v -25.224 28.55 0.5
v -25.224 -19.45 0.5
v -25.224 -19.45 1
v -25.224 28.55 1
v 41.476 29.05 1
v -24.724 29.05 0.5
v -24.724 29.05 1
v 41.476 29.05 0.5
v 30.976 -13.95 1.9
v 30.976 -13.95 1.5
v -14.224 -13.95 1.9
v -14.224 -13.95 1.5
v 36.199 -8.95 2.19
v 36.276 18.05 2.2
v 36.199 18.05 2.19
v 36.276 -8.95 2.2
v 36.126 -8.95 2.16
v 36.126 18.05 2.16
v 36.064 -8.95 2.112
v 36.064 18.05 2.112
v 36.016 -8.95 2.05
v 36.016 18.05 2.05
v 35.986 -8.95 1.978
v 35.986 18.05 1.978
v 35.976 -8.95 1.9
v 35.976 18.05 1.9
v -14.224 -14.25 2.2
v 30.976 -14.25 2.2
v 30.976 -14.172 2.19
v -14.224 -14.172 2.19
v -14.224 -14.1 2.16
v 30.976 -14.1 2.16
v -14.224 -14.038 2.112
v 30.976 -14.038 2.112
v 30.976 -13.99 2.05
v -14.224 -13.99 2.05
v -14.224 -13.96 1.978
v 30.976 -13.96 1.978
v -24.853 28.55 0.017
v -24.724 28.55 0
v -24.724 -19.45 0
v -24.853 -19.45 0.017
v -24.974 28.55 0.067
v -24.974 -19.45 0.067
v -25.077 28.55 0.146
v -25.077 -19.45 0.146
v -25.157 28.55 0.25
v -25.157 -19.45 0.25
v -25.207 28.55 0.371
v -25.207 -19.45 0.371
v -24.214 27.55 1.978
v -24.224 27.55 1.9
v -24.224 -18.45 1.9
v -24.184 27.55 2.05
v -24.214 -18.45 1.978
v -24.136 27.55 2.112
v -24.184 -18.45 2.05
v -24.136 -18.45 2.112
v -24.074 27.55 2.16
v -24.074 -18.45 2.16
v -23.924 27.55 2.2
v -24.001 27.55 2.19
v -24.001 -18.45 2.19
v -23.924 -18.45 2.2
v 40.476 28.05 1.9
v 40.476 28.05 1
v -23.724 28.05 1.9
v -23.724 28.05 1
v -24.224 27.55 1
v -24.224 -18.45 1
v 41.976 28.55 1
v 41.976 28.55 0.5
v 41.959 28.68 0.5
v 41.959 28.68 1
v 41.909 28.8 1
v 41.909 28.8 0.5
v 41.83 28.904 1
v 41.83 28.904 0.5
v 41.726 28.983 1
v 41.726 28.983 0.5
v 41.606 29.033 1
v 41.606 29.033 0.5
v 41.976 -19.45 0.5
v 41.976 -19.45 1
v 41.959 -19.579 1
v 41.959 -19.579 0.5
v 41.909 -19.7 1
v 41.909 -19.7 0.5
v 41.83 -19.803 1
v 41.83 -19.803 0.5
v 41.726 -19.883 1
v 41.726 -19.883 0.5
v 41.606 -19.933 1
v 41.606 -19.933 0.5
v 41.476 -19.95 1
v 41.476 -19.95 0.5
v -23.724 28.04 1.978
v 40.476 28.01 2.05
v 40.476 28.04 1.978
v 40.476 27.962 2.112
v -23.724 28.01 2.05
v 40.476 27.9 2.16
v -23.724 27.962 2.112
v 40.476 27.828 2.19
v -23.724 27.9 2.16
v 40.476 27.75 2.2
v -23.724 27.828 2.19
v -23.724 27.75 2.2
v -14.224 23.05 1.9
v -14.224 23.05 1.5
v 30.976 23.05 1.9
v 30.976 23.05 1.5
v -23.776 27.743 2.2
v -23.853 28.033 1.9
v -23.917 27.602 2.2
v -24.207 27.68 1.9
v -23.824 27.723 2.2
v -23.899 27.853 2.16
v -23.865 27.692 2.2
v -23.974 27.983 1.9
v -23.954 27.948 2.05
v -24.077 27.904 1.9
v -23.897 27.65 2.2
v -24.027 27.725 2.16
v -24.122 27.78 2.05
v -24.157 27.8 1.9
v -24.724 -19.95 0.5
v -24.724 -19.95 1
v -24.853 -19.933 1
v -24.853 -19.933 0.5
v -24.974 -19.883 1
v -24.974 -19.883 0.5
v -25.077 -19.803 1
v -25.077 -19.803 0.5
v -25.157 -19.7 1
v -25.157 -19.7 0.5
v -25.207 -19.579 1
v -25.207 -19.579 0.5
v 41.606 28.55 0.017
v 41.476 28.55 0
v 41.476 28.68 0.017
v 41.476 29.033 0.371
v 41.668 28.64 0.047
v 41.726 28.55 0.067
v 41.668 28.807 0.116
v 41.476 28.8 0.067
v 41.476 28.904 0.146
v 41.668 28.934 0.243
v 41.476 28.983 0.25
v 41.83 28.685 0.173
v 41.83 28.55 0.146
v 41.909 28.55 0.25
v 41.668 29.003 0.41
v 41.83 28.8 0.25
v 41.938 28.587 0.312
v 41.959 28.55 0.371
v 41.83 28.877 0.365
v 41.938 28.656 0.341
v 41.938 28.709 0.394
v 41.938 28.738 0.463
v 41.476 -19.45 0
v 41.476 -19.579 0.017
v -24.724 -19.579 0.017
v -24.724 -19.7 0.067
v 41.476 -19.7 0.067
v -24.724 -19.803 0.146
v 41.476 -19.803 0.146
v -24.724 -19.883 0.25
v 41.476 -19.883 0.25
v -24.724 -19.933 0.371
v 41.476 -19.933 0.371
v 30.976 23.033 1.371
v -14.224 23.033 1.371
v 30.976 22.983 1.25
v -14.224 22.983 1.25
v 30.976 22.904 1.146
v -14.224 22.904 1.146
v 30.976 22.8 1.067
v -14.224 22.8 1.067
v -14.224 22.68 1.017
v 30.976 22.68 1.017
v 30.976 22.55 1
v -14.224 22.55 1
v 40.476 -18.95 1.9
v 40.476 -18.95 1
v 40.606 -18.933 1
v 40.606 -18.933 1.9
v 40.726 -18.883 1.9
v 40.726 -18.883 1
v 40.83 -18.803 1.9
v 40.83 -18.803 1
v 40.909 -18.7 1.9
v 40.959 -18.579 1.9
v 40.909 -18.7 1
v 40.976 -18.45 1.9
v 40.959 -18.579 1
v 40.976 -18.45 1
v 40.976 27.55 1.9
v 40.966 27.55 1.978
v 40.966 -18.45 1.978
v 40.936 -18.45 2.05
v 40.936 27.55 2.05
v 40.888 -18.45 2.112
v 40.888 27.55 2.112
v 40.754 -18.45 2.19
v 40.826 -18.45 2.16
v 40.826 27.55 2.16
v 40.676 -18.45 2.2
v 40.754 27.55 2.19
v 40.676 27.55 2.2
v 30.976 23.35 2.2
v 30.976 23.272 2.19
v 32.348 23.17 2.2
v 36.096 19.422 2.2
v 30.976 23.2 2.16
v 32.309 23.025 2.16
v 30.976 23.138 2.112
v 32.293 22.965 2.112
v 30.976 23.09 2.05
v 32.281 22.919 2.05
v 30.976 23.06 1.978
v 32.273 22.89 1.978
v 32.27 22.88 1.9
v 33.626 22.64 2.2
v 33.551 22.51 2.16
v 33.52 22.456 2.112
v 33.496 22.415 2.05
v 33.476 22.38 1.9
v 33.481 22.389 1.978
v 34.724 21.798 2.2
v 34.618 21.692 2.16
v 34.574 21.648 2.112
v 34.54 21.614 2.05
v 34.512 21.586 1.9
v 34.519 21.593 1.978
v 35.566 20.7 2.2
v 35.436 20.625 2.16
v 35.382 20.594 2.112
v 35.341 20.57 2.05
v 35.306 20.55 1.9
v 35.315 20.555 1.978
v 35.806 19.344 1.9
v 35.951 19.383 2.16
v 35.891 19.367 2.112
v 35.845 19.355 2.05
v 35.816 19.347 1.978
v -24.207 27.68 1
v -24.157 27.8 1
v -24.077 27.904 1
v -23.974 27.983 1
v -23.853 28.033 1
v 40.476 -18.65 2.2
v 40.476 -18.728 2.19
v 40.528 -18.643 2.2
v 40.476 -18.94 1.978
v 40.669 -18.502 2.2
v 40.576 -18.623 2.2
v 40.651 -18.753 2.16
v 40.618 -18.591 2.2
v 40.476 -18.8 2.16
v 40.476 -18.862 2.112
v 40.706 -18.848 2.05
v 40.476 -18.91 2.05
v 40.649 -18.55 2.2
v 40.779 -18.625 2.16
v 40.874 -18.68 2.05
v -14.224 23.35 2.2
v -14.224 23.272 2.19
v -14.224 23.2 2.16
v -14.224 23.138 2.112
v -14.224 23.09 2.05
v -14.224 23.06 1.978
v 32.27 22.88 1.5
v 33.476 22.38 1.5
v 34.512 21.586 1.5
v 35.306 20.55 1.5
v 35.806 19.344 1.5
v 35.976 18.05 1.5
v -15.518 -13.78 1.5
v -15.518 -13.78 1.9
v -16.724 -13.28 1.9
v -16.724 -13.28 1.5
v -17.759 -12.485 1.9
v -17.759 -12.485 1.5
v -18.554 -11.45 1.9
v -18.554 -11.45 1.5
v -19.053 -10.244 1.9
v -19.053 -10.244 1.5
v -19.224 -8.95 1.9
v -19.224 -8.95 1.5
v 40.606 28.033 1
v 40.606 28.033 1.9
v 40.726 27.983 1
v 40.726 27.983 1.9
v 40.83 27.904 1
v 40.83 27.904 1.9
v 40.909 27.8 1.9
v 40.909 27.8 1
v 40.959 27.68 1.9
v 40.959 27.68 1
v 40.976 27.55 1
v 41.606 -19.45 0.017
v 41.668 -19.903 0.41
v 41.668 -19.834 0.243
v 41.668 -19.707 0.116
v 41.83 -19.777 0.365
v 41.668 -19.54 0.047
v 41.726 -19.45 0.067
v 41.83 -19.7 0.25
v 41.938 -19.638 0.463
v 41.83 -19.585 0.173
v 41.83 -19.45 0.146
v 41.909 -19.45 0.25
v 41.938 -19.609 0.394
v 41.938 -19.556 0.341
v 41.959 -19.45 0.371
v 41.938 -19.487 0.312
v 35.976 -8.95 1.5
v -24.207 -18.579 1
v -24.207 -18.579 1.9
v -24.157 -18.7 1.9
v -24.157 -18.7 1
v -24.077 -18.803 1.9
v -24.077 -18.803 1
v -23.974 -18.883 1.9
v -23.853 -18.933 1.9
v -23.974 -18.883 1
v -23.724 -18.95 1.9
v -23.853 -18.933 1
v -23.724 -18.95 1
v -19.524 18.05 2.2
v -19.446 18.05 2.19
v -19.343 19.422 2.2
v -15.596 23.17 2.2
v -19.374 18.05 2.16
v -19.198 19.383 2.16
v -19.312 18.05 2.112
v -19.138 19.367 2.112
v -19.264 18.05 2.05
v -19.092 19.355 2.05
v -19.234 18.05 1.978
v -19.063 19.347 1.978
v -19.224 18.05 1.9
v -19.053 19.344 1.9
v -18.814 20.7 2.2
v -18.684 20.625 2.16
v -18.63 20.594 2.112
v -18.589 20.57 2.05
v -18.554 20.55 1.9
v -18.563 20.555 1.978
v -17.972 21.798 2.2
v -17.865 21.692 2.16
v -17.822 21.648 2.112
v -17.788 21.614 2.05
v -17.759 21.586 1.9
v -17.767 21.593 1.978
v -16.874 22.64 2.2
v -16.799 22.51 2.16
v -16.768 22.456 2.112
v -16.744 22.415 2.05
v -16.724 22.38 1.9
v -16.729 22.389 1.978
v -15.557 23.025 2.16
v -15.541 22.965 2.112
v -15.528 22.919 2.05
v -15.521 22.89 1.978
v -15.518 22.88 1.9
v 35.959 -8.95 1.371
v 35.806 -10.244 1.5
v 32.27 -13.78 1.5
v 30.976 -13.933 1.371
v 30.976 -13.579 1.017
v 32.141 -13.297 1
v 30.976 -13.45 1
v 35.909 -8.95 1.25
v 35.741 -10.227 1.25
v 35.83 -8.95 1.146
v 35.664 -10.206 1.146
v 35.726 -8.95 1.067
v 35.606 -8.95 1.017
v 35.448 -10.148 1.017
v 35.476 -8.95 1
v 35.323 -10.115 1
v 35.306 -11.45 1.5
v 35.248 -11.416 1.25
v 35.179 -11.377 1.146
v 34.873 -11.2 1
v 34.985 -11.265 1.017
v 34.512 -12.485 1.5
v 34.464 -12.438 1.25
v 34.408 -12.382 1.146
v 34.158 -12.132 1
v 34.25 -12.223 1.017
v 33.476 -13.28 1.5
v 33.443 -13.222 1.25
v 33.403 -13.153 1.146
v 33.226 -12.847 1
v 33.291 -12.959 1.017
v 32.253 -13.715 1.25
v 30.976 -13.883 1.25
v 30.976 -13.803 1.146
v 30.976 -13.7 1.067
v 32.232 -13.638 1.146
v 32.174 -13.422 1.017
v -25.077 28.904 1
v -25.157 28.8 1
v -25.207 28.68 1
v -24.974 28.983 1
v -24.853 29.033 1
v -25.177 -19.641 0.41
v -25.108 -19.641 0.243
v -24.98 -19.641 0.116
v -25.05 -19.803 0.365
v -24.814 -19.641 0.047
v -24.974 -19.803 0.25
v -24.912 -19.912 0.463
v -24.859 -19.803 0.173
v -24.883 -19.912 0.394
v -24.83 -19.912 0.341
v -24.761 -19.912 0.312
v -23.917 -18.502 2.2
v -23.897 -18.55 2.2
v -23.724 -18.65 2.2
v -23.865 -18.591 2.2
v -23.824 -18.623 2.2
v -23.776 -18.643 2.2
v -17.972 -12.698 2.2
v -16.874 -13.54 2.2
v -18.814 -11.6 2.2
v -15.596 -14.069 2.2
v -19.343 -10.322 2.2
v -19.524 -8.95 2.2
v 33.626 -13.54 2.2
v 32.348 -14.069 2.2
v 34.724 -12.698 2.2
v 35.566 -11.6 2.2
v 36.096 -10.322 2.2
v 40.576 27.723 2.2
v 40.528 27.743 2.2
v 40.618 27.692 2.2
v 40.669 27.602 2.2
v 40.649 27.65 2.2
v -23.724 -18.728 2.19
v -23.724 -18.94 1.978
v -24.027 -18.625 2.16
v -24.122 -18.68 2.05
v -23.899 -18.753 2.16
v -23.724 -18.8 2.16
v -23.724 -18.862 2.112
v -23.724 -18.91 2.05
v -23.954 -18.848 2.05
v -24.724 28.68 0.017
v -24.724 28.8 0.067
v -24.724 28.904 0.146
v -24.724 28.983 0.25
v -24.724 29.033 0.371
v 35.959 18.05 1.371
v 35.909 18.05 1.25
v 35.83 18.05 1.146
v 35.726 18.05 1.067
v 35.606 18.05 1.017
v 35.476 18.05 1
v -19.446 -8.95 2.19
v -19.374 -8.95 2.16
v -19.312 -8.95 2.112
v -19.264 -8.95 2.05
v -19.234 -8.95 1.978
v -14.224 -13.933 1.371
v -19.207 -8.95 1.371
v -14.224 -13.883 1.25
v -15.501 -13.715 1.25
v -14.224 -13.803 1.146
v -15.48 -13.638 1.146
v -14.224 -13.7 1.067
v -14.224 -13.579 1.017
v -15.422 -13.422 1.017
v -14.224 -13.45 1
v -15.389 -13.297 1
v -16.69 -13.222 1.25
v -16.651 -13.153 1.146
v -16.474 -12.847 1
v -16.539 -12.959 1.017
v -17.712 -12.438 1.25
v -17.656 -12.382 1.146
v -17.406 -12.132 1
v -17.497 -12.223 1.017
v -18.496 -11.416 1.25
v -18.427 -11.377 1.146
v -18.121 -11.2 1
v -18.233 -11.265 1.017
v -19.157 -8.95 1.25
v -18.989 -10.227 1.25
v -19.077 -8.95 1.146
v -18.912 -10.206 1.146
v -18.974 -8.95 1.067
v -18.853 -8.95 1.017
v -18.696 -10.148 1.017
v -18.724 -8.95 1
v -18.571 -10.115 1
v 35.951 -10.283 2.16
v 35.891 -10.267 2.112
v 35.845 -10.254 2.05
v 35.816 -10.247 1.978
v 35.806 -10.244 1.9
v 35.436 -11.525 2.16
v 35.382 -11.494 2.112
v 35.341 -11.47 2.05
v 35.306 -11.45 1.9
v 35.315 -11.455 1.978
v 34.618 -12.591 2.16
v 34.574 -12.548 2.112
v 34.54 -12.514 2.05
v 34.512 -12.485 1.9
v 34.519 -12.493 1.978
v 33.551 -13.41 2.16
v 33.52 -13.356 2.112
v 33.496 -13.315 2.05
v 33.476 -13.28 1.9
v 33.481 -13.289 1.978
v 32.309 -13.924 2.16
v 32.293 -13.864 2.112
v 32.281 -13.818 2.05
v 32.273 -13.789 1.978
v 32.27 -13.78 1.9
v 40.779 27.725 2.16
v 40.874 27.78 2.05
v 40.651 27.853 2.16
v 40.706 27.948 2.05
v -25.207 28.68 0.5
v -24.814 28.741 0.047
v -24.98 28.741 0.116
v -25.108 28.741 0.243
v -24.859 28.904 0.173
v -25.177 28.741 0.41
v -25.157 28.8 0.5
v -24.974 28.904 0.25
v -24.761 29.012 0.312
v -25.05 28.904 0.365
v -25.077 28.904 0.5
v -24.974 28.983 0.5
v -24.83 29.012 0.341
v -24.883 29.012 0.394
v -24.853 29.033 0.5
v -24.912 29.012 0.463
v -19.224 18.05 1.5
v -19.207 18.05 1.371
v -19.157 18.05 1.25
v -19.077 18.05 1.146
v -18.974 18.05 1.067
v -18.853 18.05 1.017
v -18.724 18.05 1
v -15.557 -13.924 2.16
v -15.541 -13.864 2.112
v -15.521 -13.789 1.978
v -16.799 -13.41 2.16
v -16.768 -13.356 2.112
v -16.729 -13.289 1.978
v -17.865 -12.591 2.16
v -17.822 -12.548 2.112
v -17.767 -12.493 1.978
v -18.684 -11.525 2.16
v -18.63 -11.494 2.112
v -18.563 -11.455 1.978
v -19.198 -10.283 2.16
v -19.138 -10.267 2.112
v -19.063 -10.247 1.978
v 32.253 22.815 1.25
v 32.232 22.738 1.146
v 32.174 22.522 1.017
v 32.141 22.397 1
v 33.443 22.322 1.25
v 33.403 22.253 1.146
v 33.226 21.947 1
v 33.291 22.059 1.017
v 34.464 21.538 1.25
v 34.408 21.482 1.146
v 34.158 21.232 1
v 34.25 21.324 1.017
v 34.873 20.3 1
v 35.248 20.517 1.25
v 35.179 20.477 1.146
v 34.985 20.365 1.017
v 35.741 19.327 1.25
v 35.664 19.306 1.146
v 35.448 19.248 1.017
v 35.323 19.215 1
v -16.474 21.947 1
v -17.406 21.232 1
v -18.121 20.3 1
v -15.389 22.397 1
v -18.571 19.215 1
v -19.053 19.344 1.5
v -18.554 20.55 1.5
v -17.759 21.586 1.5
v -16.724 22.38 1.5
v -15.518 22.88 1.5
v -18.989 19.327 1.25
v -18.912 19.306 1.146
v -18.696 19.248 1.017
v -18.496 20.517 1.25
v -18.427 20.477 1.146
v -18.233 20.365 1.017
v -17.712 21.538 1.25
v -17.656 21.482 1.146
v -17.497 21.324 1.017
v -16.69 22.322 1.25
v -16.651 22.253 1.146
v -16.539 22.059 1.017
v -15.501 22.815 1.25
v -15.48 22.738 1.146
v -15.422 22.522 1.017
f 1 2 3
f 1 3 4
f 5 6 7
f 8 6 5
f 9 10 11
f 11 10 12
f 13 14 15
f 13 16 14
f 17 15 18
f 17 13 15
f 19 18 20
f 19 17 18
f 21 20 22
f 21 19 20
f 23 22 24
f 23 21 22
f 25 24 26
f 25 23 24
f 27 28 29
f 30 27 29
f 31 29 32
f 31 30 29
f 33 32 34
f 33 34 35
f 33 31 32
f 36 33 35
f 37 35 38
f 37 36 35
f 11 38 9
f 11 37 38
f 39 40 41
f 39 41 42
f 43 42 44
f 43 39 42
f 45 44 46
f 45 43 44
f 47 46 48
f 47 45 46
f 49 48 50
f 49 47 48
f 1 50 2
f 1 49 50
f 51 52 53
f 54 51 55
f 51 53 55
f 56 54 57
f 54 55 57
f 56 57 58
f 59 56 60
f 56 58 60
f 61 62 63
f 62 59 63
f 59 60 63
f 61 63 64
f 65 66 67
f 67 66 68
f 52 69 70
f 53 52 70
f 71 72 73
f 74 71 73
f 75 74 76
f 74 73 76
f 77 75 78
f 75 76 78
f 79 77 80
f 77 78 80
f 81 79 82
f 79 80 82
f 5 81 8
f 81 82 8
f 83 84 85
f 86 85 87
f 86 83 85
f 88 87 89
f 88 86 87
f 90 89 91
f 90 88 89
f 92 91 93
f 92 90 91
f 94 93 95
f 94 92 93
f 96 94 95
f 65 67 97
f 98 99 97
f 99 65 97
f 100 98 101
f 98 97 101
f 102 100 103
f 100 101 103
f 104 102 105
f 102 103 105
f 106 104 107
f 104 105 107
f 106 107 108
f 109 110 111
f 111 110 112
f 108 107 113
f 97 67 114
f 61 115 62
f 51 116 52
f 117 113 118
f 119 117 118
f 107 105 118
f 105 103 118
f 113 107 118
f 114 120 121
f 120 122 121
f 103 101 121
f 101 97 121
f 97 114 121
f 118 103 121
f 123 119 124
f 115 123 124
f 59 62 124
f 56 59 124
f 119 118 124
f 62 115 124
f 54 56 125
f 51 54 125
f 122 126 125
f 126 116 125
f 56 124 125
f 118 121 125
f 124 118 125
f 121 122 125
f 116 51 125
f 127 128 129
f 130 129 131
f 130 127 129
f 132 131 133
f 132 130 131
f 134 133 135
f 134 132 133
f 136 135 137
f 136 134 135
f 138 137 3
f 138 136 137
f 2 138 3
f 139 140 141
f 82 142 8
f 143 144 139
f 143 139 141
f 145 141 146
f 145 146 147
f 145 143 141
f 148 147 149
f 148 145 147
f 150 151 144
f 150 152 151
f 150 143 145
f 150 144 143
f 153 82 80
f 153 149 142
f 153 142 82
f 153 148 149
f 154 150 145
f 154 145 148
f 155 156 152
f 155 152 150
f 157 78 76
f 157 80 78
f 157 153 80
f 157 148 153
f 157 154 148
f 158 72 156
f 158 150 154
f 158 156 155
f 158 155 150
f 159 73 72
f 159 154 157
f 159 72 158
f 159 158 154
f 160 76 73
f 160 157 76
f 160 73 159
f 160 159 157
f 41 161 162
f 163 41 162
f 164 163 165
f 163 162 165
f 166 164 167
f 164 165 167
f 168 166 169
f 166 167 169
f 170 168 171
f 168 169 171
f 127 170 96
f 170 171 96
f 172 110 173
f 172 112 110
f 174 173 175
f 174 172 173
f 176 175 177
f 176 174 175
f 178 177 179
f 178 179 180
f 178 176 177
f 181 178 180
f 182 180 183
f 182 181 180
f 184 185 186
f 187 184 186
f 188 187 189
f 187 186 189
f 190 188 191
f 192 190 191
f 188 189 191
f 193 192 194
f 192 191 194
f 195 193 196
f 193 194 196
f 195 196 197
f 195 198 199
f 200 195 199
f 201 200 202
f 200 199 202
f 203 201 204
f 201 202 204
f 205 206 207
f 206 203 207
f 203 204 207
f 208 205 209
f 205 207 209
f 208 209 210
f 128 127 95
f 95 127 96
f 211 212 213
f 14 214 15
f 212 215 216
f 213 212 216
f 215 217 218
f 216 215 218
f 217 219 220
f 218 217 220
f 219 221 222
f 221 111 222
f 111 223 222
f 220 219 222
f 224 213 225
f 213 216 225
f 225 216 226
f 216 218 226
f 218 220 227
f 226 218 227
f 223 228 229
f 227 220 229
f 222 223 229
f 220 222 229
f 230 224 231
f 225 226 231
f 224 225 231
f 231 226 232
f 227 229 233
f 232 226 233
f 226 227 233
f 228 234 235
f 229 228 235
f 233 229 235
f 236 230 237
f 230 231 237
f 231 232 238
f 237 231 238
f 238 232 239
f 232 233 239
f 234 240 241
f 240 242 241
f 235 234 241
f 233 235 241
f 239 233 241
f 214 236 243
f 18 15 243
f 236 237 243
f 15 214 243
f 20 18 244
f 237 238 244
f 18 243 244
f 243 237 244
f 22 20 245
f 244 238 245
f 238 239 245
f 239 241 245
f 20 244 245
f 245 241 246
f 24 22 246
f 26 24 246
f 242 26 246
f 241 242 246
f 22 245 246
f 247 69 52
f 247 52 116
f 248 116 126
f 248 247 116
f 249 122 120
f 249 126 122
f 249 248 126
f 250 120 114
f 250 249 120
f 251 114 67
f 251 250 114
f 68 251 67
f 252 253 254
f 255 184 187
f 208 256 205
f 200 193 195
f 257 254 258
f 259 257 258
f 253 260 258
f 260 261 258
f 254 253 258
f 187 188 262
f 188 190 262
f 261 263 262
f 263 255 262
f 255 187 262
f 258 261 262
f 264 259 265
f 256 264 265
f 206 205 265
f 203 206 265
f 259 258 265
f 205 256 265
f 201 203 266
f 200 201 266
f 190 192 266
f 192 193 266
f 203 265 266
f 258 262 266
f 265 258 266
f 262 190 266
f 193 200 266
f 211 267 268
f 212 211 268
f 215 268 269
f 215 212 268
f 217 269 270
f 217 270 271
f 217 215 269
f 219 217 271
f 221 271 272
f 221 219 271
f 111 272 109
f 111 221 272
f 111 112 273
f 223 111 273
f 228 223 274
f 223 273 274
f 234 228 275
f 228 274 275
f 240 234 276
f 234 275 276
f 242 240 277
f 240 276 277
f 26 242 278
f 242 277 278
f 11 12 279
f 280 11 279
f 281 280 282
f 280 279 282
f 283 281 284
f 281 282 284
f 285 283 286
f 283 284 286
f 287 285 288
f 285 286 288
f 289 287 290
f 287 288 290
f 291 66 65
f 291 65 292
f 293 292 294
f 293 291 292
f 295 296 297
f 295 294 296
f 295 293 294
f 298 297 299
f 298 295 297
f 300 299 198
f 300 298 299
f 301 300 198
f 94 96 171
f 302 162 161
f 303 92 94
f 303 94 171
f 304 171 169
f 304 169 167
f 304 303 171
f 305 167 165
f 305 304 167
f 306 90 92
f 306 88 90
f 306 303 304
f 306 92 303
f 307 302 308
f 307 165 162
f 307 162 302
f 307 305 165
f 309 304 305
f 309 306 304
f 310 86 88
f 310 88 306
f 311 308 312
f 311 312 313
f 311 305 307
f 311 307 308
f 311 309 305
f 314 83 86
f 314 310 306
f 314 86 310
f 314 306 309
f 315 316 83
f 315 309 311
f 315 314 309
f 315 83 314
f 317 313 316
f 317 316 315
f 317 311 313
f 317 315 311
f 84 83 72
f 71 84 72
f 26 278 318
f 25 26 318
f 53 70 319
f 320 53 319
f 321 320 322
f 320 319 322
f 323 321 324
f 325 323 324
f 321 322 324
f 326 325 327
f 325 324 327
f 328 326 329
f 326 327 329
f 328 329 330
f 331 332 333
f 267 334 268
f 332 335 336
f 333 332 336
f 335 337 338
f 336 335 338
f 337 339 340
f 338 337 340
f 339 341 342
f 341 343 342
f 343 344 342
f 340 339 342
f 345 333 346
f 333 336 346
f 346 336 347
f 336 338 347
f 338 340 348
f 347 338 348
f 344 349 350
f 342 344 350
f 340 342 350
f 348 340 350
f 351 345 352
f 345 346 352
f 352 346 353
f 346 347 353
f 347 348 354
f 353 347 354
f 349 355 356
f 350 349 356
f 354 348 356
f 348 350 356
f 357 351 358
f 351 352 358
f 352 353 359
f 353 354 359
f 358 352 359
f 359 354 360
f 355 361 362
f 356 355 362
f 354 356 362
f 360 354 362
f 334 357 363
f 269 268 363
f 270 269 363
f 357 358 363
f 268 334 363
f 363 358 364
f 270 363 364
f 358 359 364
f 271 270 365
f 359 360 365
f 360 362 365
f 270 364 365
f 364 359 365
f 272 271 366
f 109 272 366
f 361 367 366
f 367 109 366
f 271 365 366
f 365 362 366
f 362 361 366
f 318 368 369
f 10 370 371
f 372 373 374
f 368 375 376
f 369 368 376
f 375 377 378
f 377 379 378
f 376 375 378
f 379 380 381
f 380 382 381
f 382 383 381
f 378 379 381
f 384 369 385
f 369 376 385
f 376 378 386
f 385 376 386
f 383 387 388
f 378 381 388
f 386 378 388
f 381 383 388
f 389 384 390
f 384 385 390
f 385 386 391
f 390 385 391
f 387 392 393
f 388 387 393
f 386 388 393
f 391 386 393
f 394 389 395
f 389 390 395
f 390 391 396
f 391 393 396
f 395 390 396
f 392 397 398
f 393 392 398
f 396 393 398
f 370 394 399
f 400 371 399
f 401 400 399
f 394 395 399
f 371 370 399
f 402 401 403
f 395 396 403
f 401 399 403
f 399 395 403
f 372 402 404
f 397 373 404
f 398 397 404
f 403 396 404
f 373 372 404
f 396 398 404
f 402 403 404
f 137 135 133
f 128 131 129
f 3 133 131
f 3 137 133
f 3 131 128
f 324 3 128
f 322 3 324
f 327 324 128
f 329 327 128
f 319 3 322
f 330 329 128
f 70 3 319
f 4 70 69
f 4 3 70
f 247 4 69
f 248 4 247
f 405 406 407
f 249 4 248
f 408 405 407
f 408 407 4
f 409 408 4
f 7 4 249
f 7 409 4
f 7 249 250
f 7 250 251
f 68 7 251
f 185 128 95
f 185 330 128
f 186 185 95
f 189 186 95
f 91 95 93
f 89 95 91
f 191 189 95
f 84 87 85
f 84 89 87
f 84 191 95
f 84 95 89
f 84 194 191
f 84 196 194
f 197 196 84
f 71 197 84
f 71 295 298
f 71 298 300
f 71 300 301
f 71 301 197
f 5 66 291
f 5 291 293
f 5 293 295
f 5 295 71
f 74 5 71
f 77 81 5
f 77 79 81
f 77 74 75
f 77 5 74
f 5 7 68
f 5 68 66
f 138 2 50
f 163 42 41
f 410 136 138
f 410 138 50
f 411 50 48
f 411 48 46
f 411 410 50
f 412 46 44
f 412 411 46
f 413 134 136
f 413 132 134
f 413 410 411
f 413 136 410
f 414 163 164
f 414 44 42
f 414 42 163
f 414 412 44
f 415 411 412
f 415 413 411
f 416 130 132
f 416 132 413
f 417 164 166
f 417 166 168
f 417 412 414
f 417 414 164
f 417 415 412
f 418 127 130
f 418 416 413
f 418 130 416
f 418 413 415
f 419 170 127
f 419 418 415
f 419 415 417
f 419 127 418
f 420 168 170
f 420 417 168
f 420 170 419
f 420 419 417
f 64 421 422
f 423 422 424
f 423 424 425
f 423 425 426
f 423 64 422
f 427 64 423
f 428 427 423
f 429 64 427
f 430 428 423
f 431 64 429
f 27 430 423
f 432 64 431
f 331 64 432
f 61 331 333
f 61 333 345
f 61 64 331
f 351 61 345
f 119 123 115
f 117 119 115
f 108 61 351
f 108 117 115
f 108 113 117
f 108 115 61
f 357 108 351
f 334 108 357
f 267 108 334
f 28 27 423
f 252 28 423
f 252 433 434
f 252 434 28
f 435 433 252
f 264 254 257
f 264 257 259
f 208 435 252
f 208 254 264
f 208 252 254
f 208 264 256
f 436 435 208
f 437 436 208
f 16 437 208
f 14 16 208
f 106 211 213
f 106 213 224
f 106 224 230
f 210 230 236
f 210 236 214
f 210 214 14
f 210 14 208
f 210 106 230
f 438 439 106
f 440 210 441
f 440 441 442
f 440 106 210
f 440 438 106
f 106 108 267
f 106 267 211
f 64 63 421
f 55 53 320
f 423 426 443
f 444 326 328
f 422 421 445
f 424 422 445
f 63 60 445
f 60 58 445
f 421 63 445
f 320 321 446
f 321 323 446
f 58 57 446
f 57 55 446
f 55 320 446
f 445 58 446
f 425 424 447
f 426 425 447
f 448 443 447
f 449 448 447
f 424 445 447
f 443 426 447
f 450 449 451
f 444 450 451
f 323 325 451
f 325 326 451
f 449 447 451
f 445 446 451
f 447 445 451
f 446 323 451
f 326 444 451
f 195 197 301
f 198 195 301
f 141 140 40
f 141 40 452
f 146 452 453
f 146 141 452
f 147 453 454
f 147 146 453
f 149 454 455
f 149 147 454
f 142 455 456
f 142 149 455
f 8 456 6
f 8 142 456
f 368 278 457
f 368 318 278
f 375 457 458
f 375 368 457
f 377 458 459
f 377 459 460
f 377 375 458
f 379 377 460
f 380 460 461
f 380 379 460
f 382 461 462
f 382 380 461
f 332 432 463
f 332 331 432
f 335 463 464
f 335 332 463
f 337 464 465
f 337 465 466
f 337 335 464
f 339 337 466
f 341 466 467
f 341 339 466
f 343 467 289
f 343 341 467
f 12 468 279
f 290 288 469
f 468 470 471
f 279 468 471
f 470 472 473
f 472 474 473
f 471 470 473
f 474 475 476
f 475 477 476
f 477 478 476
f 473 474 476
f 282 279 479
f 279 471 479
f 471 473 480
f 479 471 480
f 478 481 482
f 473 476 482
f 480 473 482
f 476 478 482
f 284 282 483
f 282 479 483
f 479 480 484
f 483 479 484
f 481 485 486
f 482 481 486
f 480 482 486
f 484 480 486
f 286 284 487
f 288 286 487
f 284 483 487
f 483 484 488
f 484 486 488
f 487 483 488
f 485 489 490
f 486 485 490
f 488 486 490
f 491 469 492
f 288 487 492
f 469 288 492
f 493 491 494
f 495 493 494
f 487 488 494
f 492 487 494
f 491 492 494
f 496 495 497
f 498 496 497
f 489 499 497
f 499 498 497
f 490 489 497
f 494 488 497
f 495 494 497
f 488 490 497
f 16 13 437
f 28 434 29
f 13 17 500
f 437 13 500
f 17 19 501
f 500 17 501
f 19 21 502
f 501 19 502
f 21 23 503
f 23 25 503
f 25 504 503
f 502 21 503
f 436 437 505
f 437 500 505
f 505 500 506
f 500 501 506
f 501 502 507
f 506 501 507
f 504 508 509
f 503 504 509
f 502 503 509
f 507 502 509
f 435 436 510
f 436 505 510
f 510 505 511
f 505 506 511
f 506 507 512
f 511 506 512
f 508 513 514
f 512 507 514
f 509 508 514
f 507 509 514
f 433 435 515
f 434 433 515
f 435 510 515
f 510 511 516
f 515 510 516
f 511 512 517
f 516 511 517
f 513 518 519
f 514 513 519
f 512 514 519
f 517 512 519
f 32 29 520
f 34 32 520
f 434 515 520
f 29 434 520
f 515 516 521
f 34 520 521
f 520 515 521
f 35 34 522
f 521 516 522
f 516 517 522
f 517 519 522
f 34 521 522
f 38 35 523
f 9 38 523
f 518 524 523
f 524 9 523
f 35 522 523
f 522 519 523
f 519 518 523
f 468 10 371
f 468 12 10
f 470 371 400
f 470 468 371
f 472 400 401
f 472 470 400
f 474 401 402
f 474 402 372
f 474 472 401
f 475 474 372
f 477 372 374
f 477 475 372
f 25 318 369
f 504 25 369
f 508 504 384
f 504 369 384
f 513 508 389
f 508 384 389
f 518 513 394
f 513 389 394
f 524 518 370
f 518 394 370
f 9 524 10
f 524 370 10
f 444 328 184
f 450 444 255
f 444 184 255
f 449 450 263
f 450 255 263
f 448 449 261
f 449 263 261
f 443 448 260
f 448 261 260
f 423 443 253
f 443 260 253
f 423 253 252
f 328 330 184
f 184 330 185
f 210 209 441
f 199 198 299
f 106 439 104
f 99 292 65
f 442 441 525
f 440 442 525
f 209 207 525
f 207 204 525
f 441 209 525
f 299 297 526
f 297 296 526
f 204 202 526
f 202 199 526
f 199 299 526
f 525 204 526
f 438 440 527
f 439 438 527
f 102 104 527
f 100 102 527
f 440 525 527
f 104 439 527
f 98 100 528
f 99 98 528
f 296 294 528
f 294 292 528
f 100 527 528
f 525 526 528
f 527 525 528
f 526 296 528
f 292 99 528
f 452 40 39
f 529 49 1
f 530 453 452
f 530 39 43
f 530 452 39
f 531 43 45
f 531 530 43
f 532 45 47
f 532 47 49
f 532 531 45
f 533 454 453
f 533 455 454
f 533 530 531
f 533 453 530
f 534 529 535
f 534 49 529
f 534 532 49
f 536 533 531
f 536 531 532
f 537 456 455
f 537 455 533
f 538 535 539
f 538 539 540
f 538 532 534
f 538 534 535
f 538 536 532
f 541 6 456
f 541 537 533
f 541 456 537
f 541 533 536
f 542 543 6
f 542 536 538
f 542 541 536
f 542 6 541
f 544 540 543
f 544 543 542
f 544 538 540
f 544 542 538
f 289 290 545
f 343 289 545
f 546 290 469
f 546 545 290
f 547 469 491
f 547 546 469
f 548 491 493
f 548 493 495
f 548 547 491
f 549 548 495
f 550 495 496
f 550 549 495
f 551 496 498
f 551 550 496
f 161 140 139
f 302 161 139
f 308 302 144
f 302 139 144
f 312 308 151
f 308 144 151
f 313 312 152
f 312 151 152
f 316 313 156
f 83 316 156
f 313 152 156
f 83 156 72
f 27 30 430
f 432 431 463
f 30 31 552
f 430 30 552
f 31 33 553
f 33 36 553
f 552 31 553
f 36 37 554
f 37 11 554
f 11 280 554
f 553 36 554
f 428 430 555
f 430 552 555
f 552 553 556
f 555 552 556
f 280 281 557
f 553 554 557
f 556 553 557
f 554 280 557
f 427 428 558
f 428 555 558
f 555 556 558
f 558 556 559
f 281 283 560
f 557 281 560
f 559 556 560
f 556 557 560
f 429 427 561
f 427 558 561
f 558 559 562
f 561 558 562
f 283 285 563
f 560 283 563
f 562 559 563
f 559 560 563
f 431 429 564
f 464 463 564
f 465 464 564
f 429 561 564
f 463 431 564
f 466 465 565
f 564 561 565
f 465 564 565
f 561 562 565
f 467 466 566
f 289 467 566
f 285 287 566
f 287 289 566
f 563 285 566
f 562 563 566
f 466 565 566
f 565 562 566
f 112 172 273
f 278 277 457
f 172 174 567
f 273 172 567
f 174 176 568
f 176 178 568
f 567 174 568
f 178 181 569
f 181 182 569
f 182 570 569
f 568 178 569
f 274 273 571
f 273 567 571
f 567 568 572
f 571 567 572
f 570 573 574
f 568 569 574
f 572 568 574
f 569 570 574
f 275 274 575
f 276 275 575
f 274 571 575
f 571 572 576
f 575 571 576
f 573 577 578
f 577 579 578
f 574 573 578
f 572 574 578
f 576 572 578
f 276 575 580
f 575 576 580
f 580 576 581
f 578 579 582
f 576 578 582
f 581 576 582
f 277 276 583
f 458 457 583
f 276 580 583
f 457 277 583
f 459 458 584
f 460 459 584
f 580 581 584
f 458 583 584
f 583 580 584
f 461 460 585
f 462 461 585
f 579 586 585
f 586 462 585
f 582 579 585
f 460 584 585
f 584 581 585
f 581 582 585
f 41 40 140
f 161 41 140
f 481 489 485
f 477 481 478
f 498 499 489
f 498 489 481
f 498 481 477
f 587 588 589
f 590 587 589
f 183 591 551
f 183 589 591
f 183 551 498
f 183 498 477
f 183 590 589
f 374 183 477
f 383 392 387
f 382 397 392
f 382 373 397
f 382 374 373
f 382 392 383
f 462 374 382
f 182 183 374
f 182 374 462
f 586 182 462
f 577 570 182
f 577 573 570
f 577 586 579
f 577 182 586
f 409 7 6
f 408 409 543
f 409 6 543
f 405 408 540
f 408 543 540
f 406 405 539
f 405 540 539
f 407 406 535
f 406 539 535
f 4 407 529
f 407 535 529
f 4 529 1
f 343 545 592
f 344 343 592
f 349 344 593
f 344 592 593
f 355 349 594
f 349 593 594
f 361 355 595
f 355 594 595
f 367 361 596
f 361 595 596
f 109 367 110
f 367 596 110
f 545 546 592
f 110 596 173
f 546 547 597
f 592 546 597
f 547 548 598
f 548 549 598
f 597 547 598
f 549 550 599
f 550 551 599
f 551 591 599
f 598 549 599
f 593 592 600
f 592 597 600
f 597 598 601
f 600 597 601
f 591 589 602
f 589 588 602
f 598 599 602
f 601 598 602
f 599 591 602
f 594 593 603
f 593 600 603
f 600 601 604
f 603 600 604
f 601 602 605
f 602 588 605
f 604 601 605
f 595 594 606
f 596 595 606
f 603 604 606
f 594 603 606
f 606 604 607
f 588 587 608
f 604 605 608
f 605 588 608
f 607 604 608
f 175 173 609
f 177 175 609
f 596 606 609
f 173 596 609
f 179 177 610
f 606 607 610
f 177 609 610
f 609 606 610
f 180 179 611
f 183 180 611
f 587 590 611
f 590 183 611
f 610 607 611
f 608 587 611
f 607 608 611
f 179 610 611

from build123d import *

# Parameters (mm, degrees)
F0_W         = 67.2
F0_H         = 49
F1_DEPTH     = 1
F2_DEPTH     = 2.2
F3_R         = 0.5
F4_R         = 0.3
F5_S2_W      = 0.5
F5_S2_H      = 0.5
F5_T3_DEPTH  = 0.5
F5_T8_ANGLE  = 90
F5_S10_W     = 0.5
F5_S10_H     = 0.5
F5_T11_DEPTH = 0.5
F5_T16_ANGLE = 90
F5_S18_W     = 0.5
F5_S18_H     = 0.5
F5_T19_DEPTH = 0.5
F5_T24_ANGLE = 90
F5_S26_W     = 0.5
F5_S26_H     = 0.5
F5_T27_DEPTH = 0.5
F5_T32_ANGLE = 90
F5_T35_DEPTH = 1.2
F5_T38_DEPTH = 1.75
F5_T41_DEPTH = 1.2
F5_T44_DEPTH = 1.75
F5_T47_DEPTH = 1.2
F5_T50_DEPTH = 1.75
F5_T53_DEPTH = 1.2
F5_T56_DEPTH = 1.75
F6_R         = 0.5


# Not quite as in the source:
# - a fillet or chamfer that OpenCascade refuses, or shapes differently, is made with other operations: its cross-section is extruded or revolved along the edge and cut away or added


with BuildPart() as f1:
    # F0 (on Top) → F1 (new body)
    with BuildSketch(Plane.XY):
        with Locations((8.3761618346, 4.5501037389)):
            Rectangle(F0_W, F0_H)
        Polygon((-24.2238381654, 20.0501037389), (-24.2238381654, 28.0501037389), (-16.2238381654, 28.0501037389), (32.9761618346, 28.0501037389), (40.9761618346, 28.0501037389), (40.9761618346, 20.0501037389), (40.9761618346, -10.9498962611), (40.9761618346, -18.9498962611), (32.9761618346, -18.9498962611), (-16.2238381654, -18.9498962611), (-24.2238381654, -18.9498962611), (-24.2238381654, -10.9498962611), align=None, mode=Mode.SUBTRACT)
        Polygon((-16.2238381654, 28.0501037389), (-24.2238381654, 28.0501037389), (-24.2238381654, 20.0501037389), (-24.2238381654, -10.9498962611), (-24.2238381654, -18.9498962611), (-16.2238381654, -18.9498962611), (32.9761618346, -18.9498962611), (40.9761618346, -18.9498962611), (40.9761618346, -10.9498962611), (40.9761618346, 20.0501037389), (40.9761618346, 28.0501037389), (32.9761618346, 28.0501037389), align=None)
        with BuildLine():
            ThreePointArc((-19.2238390446, 18.0501037389), (-17.7593729505, 21.5856376448), (-14.2238390446, 23.0501037389))
            Line((-14.2238390446, 23.0501037389), (30.9761627138, 23.0501037389))
            ThreePointArc((30.9761627138, 23.0501037389), (34.5116966197, 21.5856376448), (35.9761627138, 18.0501037389))
            Line((35.9761627138, 18.0501037389), (35.9761627138, -8.9498971403))
            ThreePointArc((35.9761627138, -8.9498971403), (34.5116966197, -12.4854310462), (30.9761627138, -13.9498971403))
            Line((30.9761627138, -13.9498971403), (-14.2238390446, -13.9498971403))
            ThreePointArc((-14.2238390446, -13.9498971403), (-17.7593729505, -12.4854310462), (-19.2238390446, -8.9498971403))
            Line((-19.2238390446, -8.9498971403), (-19.2238390446, 18.0501037389))
        make_face(mode=Mode.SUBTRACT)
        with BuildLine():
            Line((30.9761627138, 23.0501037389), (-14.2238390446, 23.0501037389))
            ThreePointArc((-14.2238390446, 23.0501037389), (-17.7593729505, 21.5856376448), (-19.2238390446, 18.0501037389))
            Line((-19.2238390446, 18.0501037389), (-19.2238390446, -8.9498971403))
            ThreePointArc((-19.2238390446, -8.9498971403), (-17.7593729505, -12.4854310462), (-14.2238390446, -13.9498971403))
            Line((-14.2238390446, -13.9498971403), (30.9761627138, -13.9498971403))
            ThreePointArc((30.9761627138, -13.9498971403), (34.5116966197, -12.4854310462), (35.9761627138, -8.9498971403))
            Line((35.9761627138, -8.9498971403), (35.9761627138, 18.0501037389))
            ThreePointArc((35.9761627138, 18.0501037389), (34.5116966197, 21.5856376448), (30.9761627138, 23.0501037389))
        make_face()
    extrude(amount=F1_DEPTH)

    # F0 (on Top) → F2 (join)
    with BuildSketch(Plane.XY):
        Polygon((-16.2238381654, 28.0501037389), (-24.2238381654, 28.0501037389), (-24.2238381654, 20.0501037389), (-24.2238381654, -10.9498962611), (-24.2238381654, -18.9498962611), (-16.2238381654, -18.9498962611), (32.9761618346, -18.9498962611), (40.9761618346, -18.9498962611), (40.9761618346, -10.9498962611), (40.9761618346, 20.0501037389), (40.9761618346, 28.0501037389), (32.9761618346, 28.0501037389), align=None)
        with BuildLine():
            ThreePointArc((-19.2238390446, 18.0501037389), (-17.7593729505, 21.5856376448), (-14.2238390446, 23.0501037389))
            Line((-14.2238390446, 23.0501037389), (30.9761627138, 23.0501037389))
            ThreePointArc((30.9761627138, 23.0501037389), (34.5116966197, 21.5856376448), (35.9761627138, 18.0501037389))
            Line((35.9761627138, 18.0501037389), (35.9761627138, -8.9498971403))
            ThreePointArc((35.9761627138, -8.9498971403), (34.5116966197, -12.4854310462), (30.9761627138, -13.9498971403))
            Line((30.9761627138, -13.9498971403), (-14.2238390446, -13.9498971403))
            ThreePointArc((-14.2238390446, -13.9498971403), (-17.7593729505, -12.4854310462), (-19.2238390446, -8.9498971403))
            Line((-19.2238390446, -8.9498971403), (-19.2238390446, 18.0501037389))
        make_face(mode=Mode.SUBTRACT)
    extrude(amount=F2_DEPTH)

    # F3
    f3_edges = [f1.edges().sort_by_distance(p)[0] for p in [
        (41.976162, 4.550104, 0),
        (8.376162, 29.050104, 0),
        (-25.223838, 4.550104, 0),
        (8.376162, -19.949896, 0),
    ]]
    fillet(f3_edges, radius=F3_R)

    # F4
    f4_edges = [f1.edges().sort_by_distance(p)[0] for p in [
        (8.376162, 28.050104, 2.2),
        (-24.223838, 4.550104, 2.2),
        (8.376162, -18.949896, 2.2),
        (40.976162, 4.550104, 2.2),
        (-19.223839, 4.550103, 2.2),
        (-17.759373, 21.585638, 2.2),
        (8.376162, 23.050104, 2.2),
        (34.511697, 21.585638, 2.2),
        (35.976163, 4.550103, 2.2),
        (34.511697, -12.485431, 2.2),
        (8.376162, -13.949897, 2.2),
        (-17.759373, -12.485431, 2.2),
    ]]
    fillet(f4_edges, radius=F4_R)

    # F5: fillet of radius 0.5 on 8 edges, made by hand


with BuildPart() as f5_tool1:
    # F5_s2 → F5_t3 (new body)
    with BuildSketch(Plane.XZ.offset(-28.5501037389)):
        with Locations((-24.9738381654, 0.25)):
            Rectangle(F5_S2_W, F5_S2_H)
    extrude(amount=-F5_T3_DEPTH)

    # F5_s4 → F5_t5 (revolve, cut)
    with BuildSketch(Plane(origin=(-24.7238381654, 28.5501037389, 0.5), x_dir=(0.7071067812, 0, 0.7071067812), z_dir=(-0.7071067812, 0, 0.7071067812))):
        with BuildLine():
            ThreePointArc((0, -0.5), (0.5, 0), (0, 0.5))
            Line((0, 0.5), (0, -0.5))
        make_face()
    revolve(axis=Axis((-24.7238381654, 28.5501037389, 0.5), (0, 1, 0)), mode=Mode.SUBTRACT)


with BuildPart() as f5_tool6:
    # F5_s7 → F5_t8 (revolve)
    with BuildSketch(Plane.YZ.offset(-23.7238381654)):
        with BuildLine():
            ThreePointArc((27.7501037389, 2.2), (27.9622357733, 2.1121320344), (28.0501037389, 1.9))
            Line((28.0501037389, 1.9), (28.0501037389, 2.2))
            Line((28.0501037389, 2.2), (27.7501037389, 2.2))
        make_face()
    revolve(axis=Axis((-23.7238381654, 27.5501037389, 2.2), (0, 0, 1)), revolution_arc=F5_T8_ANGLE)


with BuildPart() as f5_tool9:
    # F5_s10 → F5_t11 (new body)
    with BuildSketch(Plane.XZ.offset(19.4498962611)):
        with Locations((-24.9738381654, 0.25)):
            Rectangle(F5_S10_W, F5_S10_H)
    extrude(amount=F5_T11_DEPTH)

    # F5_s12 → F5_t13 (revolve, cut)
    with BuildSketch(Plane(origin=(-24.7238381654, -19.4498962611, 0.5), x_dir=(0.7071067812, 0, 0.7071067812), z_dir=(0.7071067812, 0, -0.7071067812))):
        with BuildLine():
            ThreePointArc((0, -0.5), (0.5, 0), (0, 0.5))
            Line((0, 0.5), (0, -0.5))
        make_face()
    revolve(axis=Axis((-24.7238381654, -19.4498962611, 0.5), (0, -1, 0)), mode=Mode.SUBTRACT)


with BuildPart() as f5_tool14:
    # F5_s15 → F5_t16 (revolve)
    with BuildSketch(Plane.XZ.offset(18.4498962611)):
        with BuildLine():
            ThreePointArc((-23.9238381654, 2.2), (-24.1359701998, 2.1121320344), (-24.2238381654, 1.9))
            Line((-24.2238381654, 1.9), (-24.2238381654, 2.2))
            Line((-24.2238381654, 2.2), (-23.9238381654, 2.2))
        make_face()
    revolve(axis=Axis((-23.7238381654, -18.4498962611, 2.2), (0, 0, 1)), revolution_arc=F5_T16_ANGLE)


with BuildPart() as f5_tool17:
    # F5_s18 → F5_t19 (new body)
    with BuildSketch(Plane.YZ.offset(41.4761618346)):
        with Locations((-19.6998962611, 0.25)):
            Rectangle(F5_S18_W, F5_S18_H)
    extrude(amount=F5_T19_DEPTH)

    # F5_s20 → F5_t21 (revolve, cut)
    with BuildSketch(Plane(origin=(41.4761618346, -19.4498962611, 0.5), x_dir=(0, 0.7071067812, 0.7071067812), z_dir=(0, 0.7071067812, -0.7071067812))):
        with BuildLine():
            ThreePointArc((0, -0.5), (0.5, 0), (0, 0.5))
            Line((0, 0.5), (0, -0.5))
        make_face()
    revolve(axis=Axis((41.4761618346, -19.4498962611, 0.5), (1, 0, 0)), mode=Mode.SUBTRACT)


with BuildPart() as f5_tool22:
    # F5_s23 → F5_t24 (revolve)
    with BuildSketch(Plane.YZ.offset(40.4761618346)):
        with BuildLine():
            ThreePointArc((-18.6498962611, 2.2), (-18.8620282955, 2.1121320344), (-18.9498962611, 1.9))
            Line((-18.9498962611, 1.9), (-18.9498962611, 2.2))
            Line((-18.9498962611, 2.2), (-18.6498962611, 2.2))
        make_face()
    revolve(axis=Axis((40.4761618346, -18.4498962611, 2.2), (0, 0, 1)), revolution_arc=F5_T24_ANGLE)


with BuildPart() as f5_tool25:
    # F5_s26 → F5_t27 (new body)
    with BuildSketch(Plane.YZ.offset(41.4761618346)):
        with Locations((28.8001037389, 0.25)):
            Rectangle(F5_S26_W, F5_S26_H)
    extrude(amount=F5_T27_DEPTH)

    # F5_s28 → F5_t29 (revolve, cut)
    with BuildSketch(Plane(origin=(41.4761618346, 28.5501037389, 0.5), x_dir=(0, -0.7071067812, 0.7071067812), z_dir=(0, 0.7071067812, 0.7071067812))):
        with BuildLine():
            ThreePointArc((0, -0.5), (0.5, 0), (0, 0.5))
            Line((0, 0.5), (0, -0.5))
        make_face()
    revolve(axis=Axis((41.4761618346, 28.5501037389, 0.5), (1, 0, 0)), mode=Mode.SUBTRACT)


with BuildPart() as f5_tool30:
    # F5_s31 → F5_t32 (revolve)
    with BuildSketch(Plane.XZ.offset(-27.5501037389)):
        with BuildLine():
            ThreePointArc((40.6761618346, 2.2), (40.888293869, 2.1121320344), (40.9761618346, 1.9))
            Line((40.9761618346, 1.9), (40.9761618346, 2.2))
            Line((40.9761618346, 2.2), (40.6761618346, 2.2))
        make_face()
    revolve(axis=Axis((40.4761618346, 27.5501037389, 2.2), (0, 0, 1)), revolution_arc=F5_T32_ANGLE)


with BuildPart() as f5_tool33:
    # F5_s34 → F5_t35 (new body)
    with BuildSketch(Plane.XY.offset(1)):
        with BuildLine():
            ThreePointArc((40.4761618346, 28.0501037389), (40.8297152252, 27.9036571295), (40.9761618346, 27.5501037389))
            Line((40.9761618346, 27.5501037389), (40.9761618346, 28.0501037389))
            Line((40.9761618346, 28.0501037389), (40.4761618346, 28.0501037389))
        make_face()
    extrude(amount=F5_T35_DEPTH)


with BuildPart() as f5_tool36:
    # F5_s37 → F5_t38 (new body)
    with BuildSketch(Plane.XY.offset(0.5)):
        with BuildLine():
            ThreePointArc((41.9761618346, 28.5501037389), (41.8297152252, 28.9036571295), (41.4761618346, 29.0501037389))
            Line((41.4761618346, 29.0501037389), (41.9761618346, 29.0501037389))
            Line((41.9761618346, 29.0501037389), (41.9761618346, 28.5501037389))
        make_face()
    extrude(amount=F5_T38_DEPTH)


with BuildPart() as f5_tool39:
    # F5_s40 → F5_t41 (new body)
    with BuildSketch(Plane.XY.offset(1)):
        with BuildLine():
            ThreePointArc((40.4761618346, -18.9498962611), (40.8297152252, -18.8034496517), (40.9761618346, -18.4498962611))
            Line((40.9761618346, -18.4498962611), (40.9761618346, -18.9498962611))
            Line((40.9761618346, -18.9498962611), (40.4761618346, -18.9498962611))
        make_face()
    extrude(amount=F5_T41_DEPTH)


with BuildPart() as f5_tool42:
    # F5_s43 → F5_t44 (new body)
    with BuildSketch(Plane.XY.offset(0.5)):
        with BuildLine():
            ThreePointArc((41.9761618346, -19.4498962611), (41.8297152252, -19.8034496517), (41.4761618346, -19.9498962611))
            Line((41.4761618346, -19.9498962611), (41.9761618346, -19.9498962611))
            Line((41.9761618346, -19.9498962611), (41.9761618346, -19.4498962611))
        make_face()
    extrude(amount=F5_T44_DEPTH)


with BuildPart() as f5_tool45:
    # F5_s46 → F5_t47 (new body)
    with BuildSketch(Plane.XY.offset(1)):
        with BuildLine():
            ThreePointArc((-24.2238381654, -18.4498962611), (-24.077391556, -18.8034496517), (-23.7238381654, -18.9498962611))
            Line((-23.7238381654, -18.9498962611), (-24.2238381654, -18.9498962611))
            Line((-24.2238381654, -18.9498962611), (-24.2238381654, -18.4498962611))
        make_face()
    extrude(amount=F5_T47_DEPTH)


with BuildPart() as f5_tool48:
    # F5_s49 → F5_t50 (new body)
    with BuildSketch(Plane.XY.offset(0.5)):
        with BuildLine():
            ThreePointArc((-24.7238381654, -19.9498962611), (-25.077391556, -19.8034496517), (-25.2238381654, -19.4498962611))
            Line((-25.2238381654, -19.4498962611), (-25.2238381654, -19.9498962611))
            Line((-25.2238381654, -19.9498962611), (-24.7238381654, -19.9498962611))
        make_face()
    extrude(amount=F5_T50_DEPTH)


with BuildPart() as f5_tool51:
    # F5_s52 → F5_t53 (new body)
    with BuildSketch(Plane.XY.offset(1)):
        with BuildLine():
            ThreePointArc((-24.2238381654, 27.5501037389), (-24.077391556, 27.9036571295), (-23.7238381654, 28.0501037389))
            Line((-23.7238381654, 28.0501037389), (-24.2238381654, 28.0501037389))
            Line((-24.2238381654, 28.0501037389), (-24.2238381654, 27.5501037389))
        make_face()
    extrude(amount=F5_T53_DEPTH)


with BuildPart() as f5_tool54:
    # F5_s55 → F5_t56 (new body)
    with BuildSketch(Plane.XY.offset(0.5)):
        with BuildLine():
            ThreePointArc((-24.7238381654, 29.0501037389), (-25.077391556, 28.9036571295), (-25.2238381654, 28.5501037389))
            Line((-25.2238381654, 28.5501037389), (-25.2238381654, 29.0501037389))
            Line((-25.2238381654, 29.0501037389), (-24.7238381654, 29.0501037389))
        make_face()
    extrude(amount=F5_T56_DEPTH)


with BuildPart() as f1_1:
    add(f1.part)

    # F5_t57: cut F5_tool1, F5_tool6, F5_tool9, F5_tool14, F5_tool17, F5_tool22, F5_tool25, F5_tool30, F5_tool33, F5_tool36, F5_tool39, F5_tool42, F5_tool45, F5_tool48, F5_tool51, F5_tool54
    add([f5_tool1.part, f5_tool6.part, f5_tool9.part, f5_tool14.part, f5_tool17.part, f5_tool22.part, f5_tool25.part, f5_tool30.part, f5_tool33.part, f5_tool36.part, f5_tool39.part, f5_tool42.part, f5_tool45.part, f5_tool48.part, f5_tool51.part, f5_tool54.part], mode=Mode.SUBTRACT)

    # F6
    f6_edges = [f1_1.edges().sort_by_distance(p)[0] for p in [
        (-17.759373, -12.485431, 1),
        (-19.223839, 4.550103, 1),
        (-17.759373, 21.585638, 1),
        (8.376162, 23.050104, 1),
        (34.511697, 21.585638, 1),
        (35.976163, 4.550103, 1),
        (34.511697, -12.485431, 1),
        (8.376162, -13.949897, 1),
    ]]
    fillet(f6_edges, radius=F6_R)


solid = f1_1.part
